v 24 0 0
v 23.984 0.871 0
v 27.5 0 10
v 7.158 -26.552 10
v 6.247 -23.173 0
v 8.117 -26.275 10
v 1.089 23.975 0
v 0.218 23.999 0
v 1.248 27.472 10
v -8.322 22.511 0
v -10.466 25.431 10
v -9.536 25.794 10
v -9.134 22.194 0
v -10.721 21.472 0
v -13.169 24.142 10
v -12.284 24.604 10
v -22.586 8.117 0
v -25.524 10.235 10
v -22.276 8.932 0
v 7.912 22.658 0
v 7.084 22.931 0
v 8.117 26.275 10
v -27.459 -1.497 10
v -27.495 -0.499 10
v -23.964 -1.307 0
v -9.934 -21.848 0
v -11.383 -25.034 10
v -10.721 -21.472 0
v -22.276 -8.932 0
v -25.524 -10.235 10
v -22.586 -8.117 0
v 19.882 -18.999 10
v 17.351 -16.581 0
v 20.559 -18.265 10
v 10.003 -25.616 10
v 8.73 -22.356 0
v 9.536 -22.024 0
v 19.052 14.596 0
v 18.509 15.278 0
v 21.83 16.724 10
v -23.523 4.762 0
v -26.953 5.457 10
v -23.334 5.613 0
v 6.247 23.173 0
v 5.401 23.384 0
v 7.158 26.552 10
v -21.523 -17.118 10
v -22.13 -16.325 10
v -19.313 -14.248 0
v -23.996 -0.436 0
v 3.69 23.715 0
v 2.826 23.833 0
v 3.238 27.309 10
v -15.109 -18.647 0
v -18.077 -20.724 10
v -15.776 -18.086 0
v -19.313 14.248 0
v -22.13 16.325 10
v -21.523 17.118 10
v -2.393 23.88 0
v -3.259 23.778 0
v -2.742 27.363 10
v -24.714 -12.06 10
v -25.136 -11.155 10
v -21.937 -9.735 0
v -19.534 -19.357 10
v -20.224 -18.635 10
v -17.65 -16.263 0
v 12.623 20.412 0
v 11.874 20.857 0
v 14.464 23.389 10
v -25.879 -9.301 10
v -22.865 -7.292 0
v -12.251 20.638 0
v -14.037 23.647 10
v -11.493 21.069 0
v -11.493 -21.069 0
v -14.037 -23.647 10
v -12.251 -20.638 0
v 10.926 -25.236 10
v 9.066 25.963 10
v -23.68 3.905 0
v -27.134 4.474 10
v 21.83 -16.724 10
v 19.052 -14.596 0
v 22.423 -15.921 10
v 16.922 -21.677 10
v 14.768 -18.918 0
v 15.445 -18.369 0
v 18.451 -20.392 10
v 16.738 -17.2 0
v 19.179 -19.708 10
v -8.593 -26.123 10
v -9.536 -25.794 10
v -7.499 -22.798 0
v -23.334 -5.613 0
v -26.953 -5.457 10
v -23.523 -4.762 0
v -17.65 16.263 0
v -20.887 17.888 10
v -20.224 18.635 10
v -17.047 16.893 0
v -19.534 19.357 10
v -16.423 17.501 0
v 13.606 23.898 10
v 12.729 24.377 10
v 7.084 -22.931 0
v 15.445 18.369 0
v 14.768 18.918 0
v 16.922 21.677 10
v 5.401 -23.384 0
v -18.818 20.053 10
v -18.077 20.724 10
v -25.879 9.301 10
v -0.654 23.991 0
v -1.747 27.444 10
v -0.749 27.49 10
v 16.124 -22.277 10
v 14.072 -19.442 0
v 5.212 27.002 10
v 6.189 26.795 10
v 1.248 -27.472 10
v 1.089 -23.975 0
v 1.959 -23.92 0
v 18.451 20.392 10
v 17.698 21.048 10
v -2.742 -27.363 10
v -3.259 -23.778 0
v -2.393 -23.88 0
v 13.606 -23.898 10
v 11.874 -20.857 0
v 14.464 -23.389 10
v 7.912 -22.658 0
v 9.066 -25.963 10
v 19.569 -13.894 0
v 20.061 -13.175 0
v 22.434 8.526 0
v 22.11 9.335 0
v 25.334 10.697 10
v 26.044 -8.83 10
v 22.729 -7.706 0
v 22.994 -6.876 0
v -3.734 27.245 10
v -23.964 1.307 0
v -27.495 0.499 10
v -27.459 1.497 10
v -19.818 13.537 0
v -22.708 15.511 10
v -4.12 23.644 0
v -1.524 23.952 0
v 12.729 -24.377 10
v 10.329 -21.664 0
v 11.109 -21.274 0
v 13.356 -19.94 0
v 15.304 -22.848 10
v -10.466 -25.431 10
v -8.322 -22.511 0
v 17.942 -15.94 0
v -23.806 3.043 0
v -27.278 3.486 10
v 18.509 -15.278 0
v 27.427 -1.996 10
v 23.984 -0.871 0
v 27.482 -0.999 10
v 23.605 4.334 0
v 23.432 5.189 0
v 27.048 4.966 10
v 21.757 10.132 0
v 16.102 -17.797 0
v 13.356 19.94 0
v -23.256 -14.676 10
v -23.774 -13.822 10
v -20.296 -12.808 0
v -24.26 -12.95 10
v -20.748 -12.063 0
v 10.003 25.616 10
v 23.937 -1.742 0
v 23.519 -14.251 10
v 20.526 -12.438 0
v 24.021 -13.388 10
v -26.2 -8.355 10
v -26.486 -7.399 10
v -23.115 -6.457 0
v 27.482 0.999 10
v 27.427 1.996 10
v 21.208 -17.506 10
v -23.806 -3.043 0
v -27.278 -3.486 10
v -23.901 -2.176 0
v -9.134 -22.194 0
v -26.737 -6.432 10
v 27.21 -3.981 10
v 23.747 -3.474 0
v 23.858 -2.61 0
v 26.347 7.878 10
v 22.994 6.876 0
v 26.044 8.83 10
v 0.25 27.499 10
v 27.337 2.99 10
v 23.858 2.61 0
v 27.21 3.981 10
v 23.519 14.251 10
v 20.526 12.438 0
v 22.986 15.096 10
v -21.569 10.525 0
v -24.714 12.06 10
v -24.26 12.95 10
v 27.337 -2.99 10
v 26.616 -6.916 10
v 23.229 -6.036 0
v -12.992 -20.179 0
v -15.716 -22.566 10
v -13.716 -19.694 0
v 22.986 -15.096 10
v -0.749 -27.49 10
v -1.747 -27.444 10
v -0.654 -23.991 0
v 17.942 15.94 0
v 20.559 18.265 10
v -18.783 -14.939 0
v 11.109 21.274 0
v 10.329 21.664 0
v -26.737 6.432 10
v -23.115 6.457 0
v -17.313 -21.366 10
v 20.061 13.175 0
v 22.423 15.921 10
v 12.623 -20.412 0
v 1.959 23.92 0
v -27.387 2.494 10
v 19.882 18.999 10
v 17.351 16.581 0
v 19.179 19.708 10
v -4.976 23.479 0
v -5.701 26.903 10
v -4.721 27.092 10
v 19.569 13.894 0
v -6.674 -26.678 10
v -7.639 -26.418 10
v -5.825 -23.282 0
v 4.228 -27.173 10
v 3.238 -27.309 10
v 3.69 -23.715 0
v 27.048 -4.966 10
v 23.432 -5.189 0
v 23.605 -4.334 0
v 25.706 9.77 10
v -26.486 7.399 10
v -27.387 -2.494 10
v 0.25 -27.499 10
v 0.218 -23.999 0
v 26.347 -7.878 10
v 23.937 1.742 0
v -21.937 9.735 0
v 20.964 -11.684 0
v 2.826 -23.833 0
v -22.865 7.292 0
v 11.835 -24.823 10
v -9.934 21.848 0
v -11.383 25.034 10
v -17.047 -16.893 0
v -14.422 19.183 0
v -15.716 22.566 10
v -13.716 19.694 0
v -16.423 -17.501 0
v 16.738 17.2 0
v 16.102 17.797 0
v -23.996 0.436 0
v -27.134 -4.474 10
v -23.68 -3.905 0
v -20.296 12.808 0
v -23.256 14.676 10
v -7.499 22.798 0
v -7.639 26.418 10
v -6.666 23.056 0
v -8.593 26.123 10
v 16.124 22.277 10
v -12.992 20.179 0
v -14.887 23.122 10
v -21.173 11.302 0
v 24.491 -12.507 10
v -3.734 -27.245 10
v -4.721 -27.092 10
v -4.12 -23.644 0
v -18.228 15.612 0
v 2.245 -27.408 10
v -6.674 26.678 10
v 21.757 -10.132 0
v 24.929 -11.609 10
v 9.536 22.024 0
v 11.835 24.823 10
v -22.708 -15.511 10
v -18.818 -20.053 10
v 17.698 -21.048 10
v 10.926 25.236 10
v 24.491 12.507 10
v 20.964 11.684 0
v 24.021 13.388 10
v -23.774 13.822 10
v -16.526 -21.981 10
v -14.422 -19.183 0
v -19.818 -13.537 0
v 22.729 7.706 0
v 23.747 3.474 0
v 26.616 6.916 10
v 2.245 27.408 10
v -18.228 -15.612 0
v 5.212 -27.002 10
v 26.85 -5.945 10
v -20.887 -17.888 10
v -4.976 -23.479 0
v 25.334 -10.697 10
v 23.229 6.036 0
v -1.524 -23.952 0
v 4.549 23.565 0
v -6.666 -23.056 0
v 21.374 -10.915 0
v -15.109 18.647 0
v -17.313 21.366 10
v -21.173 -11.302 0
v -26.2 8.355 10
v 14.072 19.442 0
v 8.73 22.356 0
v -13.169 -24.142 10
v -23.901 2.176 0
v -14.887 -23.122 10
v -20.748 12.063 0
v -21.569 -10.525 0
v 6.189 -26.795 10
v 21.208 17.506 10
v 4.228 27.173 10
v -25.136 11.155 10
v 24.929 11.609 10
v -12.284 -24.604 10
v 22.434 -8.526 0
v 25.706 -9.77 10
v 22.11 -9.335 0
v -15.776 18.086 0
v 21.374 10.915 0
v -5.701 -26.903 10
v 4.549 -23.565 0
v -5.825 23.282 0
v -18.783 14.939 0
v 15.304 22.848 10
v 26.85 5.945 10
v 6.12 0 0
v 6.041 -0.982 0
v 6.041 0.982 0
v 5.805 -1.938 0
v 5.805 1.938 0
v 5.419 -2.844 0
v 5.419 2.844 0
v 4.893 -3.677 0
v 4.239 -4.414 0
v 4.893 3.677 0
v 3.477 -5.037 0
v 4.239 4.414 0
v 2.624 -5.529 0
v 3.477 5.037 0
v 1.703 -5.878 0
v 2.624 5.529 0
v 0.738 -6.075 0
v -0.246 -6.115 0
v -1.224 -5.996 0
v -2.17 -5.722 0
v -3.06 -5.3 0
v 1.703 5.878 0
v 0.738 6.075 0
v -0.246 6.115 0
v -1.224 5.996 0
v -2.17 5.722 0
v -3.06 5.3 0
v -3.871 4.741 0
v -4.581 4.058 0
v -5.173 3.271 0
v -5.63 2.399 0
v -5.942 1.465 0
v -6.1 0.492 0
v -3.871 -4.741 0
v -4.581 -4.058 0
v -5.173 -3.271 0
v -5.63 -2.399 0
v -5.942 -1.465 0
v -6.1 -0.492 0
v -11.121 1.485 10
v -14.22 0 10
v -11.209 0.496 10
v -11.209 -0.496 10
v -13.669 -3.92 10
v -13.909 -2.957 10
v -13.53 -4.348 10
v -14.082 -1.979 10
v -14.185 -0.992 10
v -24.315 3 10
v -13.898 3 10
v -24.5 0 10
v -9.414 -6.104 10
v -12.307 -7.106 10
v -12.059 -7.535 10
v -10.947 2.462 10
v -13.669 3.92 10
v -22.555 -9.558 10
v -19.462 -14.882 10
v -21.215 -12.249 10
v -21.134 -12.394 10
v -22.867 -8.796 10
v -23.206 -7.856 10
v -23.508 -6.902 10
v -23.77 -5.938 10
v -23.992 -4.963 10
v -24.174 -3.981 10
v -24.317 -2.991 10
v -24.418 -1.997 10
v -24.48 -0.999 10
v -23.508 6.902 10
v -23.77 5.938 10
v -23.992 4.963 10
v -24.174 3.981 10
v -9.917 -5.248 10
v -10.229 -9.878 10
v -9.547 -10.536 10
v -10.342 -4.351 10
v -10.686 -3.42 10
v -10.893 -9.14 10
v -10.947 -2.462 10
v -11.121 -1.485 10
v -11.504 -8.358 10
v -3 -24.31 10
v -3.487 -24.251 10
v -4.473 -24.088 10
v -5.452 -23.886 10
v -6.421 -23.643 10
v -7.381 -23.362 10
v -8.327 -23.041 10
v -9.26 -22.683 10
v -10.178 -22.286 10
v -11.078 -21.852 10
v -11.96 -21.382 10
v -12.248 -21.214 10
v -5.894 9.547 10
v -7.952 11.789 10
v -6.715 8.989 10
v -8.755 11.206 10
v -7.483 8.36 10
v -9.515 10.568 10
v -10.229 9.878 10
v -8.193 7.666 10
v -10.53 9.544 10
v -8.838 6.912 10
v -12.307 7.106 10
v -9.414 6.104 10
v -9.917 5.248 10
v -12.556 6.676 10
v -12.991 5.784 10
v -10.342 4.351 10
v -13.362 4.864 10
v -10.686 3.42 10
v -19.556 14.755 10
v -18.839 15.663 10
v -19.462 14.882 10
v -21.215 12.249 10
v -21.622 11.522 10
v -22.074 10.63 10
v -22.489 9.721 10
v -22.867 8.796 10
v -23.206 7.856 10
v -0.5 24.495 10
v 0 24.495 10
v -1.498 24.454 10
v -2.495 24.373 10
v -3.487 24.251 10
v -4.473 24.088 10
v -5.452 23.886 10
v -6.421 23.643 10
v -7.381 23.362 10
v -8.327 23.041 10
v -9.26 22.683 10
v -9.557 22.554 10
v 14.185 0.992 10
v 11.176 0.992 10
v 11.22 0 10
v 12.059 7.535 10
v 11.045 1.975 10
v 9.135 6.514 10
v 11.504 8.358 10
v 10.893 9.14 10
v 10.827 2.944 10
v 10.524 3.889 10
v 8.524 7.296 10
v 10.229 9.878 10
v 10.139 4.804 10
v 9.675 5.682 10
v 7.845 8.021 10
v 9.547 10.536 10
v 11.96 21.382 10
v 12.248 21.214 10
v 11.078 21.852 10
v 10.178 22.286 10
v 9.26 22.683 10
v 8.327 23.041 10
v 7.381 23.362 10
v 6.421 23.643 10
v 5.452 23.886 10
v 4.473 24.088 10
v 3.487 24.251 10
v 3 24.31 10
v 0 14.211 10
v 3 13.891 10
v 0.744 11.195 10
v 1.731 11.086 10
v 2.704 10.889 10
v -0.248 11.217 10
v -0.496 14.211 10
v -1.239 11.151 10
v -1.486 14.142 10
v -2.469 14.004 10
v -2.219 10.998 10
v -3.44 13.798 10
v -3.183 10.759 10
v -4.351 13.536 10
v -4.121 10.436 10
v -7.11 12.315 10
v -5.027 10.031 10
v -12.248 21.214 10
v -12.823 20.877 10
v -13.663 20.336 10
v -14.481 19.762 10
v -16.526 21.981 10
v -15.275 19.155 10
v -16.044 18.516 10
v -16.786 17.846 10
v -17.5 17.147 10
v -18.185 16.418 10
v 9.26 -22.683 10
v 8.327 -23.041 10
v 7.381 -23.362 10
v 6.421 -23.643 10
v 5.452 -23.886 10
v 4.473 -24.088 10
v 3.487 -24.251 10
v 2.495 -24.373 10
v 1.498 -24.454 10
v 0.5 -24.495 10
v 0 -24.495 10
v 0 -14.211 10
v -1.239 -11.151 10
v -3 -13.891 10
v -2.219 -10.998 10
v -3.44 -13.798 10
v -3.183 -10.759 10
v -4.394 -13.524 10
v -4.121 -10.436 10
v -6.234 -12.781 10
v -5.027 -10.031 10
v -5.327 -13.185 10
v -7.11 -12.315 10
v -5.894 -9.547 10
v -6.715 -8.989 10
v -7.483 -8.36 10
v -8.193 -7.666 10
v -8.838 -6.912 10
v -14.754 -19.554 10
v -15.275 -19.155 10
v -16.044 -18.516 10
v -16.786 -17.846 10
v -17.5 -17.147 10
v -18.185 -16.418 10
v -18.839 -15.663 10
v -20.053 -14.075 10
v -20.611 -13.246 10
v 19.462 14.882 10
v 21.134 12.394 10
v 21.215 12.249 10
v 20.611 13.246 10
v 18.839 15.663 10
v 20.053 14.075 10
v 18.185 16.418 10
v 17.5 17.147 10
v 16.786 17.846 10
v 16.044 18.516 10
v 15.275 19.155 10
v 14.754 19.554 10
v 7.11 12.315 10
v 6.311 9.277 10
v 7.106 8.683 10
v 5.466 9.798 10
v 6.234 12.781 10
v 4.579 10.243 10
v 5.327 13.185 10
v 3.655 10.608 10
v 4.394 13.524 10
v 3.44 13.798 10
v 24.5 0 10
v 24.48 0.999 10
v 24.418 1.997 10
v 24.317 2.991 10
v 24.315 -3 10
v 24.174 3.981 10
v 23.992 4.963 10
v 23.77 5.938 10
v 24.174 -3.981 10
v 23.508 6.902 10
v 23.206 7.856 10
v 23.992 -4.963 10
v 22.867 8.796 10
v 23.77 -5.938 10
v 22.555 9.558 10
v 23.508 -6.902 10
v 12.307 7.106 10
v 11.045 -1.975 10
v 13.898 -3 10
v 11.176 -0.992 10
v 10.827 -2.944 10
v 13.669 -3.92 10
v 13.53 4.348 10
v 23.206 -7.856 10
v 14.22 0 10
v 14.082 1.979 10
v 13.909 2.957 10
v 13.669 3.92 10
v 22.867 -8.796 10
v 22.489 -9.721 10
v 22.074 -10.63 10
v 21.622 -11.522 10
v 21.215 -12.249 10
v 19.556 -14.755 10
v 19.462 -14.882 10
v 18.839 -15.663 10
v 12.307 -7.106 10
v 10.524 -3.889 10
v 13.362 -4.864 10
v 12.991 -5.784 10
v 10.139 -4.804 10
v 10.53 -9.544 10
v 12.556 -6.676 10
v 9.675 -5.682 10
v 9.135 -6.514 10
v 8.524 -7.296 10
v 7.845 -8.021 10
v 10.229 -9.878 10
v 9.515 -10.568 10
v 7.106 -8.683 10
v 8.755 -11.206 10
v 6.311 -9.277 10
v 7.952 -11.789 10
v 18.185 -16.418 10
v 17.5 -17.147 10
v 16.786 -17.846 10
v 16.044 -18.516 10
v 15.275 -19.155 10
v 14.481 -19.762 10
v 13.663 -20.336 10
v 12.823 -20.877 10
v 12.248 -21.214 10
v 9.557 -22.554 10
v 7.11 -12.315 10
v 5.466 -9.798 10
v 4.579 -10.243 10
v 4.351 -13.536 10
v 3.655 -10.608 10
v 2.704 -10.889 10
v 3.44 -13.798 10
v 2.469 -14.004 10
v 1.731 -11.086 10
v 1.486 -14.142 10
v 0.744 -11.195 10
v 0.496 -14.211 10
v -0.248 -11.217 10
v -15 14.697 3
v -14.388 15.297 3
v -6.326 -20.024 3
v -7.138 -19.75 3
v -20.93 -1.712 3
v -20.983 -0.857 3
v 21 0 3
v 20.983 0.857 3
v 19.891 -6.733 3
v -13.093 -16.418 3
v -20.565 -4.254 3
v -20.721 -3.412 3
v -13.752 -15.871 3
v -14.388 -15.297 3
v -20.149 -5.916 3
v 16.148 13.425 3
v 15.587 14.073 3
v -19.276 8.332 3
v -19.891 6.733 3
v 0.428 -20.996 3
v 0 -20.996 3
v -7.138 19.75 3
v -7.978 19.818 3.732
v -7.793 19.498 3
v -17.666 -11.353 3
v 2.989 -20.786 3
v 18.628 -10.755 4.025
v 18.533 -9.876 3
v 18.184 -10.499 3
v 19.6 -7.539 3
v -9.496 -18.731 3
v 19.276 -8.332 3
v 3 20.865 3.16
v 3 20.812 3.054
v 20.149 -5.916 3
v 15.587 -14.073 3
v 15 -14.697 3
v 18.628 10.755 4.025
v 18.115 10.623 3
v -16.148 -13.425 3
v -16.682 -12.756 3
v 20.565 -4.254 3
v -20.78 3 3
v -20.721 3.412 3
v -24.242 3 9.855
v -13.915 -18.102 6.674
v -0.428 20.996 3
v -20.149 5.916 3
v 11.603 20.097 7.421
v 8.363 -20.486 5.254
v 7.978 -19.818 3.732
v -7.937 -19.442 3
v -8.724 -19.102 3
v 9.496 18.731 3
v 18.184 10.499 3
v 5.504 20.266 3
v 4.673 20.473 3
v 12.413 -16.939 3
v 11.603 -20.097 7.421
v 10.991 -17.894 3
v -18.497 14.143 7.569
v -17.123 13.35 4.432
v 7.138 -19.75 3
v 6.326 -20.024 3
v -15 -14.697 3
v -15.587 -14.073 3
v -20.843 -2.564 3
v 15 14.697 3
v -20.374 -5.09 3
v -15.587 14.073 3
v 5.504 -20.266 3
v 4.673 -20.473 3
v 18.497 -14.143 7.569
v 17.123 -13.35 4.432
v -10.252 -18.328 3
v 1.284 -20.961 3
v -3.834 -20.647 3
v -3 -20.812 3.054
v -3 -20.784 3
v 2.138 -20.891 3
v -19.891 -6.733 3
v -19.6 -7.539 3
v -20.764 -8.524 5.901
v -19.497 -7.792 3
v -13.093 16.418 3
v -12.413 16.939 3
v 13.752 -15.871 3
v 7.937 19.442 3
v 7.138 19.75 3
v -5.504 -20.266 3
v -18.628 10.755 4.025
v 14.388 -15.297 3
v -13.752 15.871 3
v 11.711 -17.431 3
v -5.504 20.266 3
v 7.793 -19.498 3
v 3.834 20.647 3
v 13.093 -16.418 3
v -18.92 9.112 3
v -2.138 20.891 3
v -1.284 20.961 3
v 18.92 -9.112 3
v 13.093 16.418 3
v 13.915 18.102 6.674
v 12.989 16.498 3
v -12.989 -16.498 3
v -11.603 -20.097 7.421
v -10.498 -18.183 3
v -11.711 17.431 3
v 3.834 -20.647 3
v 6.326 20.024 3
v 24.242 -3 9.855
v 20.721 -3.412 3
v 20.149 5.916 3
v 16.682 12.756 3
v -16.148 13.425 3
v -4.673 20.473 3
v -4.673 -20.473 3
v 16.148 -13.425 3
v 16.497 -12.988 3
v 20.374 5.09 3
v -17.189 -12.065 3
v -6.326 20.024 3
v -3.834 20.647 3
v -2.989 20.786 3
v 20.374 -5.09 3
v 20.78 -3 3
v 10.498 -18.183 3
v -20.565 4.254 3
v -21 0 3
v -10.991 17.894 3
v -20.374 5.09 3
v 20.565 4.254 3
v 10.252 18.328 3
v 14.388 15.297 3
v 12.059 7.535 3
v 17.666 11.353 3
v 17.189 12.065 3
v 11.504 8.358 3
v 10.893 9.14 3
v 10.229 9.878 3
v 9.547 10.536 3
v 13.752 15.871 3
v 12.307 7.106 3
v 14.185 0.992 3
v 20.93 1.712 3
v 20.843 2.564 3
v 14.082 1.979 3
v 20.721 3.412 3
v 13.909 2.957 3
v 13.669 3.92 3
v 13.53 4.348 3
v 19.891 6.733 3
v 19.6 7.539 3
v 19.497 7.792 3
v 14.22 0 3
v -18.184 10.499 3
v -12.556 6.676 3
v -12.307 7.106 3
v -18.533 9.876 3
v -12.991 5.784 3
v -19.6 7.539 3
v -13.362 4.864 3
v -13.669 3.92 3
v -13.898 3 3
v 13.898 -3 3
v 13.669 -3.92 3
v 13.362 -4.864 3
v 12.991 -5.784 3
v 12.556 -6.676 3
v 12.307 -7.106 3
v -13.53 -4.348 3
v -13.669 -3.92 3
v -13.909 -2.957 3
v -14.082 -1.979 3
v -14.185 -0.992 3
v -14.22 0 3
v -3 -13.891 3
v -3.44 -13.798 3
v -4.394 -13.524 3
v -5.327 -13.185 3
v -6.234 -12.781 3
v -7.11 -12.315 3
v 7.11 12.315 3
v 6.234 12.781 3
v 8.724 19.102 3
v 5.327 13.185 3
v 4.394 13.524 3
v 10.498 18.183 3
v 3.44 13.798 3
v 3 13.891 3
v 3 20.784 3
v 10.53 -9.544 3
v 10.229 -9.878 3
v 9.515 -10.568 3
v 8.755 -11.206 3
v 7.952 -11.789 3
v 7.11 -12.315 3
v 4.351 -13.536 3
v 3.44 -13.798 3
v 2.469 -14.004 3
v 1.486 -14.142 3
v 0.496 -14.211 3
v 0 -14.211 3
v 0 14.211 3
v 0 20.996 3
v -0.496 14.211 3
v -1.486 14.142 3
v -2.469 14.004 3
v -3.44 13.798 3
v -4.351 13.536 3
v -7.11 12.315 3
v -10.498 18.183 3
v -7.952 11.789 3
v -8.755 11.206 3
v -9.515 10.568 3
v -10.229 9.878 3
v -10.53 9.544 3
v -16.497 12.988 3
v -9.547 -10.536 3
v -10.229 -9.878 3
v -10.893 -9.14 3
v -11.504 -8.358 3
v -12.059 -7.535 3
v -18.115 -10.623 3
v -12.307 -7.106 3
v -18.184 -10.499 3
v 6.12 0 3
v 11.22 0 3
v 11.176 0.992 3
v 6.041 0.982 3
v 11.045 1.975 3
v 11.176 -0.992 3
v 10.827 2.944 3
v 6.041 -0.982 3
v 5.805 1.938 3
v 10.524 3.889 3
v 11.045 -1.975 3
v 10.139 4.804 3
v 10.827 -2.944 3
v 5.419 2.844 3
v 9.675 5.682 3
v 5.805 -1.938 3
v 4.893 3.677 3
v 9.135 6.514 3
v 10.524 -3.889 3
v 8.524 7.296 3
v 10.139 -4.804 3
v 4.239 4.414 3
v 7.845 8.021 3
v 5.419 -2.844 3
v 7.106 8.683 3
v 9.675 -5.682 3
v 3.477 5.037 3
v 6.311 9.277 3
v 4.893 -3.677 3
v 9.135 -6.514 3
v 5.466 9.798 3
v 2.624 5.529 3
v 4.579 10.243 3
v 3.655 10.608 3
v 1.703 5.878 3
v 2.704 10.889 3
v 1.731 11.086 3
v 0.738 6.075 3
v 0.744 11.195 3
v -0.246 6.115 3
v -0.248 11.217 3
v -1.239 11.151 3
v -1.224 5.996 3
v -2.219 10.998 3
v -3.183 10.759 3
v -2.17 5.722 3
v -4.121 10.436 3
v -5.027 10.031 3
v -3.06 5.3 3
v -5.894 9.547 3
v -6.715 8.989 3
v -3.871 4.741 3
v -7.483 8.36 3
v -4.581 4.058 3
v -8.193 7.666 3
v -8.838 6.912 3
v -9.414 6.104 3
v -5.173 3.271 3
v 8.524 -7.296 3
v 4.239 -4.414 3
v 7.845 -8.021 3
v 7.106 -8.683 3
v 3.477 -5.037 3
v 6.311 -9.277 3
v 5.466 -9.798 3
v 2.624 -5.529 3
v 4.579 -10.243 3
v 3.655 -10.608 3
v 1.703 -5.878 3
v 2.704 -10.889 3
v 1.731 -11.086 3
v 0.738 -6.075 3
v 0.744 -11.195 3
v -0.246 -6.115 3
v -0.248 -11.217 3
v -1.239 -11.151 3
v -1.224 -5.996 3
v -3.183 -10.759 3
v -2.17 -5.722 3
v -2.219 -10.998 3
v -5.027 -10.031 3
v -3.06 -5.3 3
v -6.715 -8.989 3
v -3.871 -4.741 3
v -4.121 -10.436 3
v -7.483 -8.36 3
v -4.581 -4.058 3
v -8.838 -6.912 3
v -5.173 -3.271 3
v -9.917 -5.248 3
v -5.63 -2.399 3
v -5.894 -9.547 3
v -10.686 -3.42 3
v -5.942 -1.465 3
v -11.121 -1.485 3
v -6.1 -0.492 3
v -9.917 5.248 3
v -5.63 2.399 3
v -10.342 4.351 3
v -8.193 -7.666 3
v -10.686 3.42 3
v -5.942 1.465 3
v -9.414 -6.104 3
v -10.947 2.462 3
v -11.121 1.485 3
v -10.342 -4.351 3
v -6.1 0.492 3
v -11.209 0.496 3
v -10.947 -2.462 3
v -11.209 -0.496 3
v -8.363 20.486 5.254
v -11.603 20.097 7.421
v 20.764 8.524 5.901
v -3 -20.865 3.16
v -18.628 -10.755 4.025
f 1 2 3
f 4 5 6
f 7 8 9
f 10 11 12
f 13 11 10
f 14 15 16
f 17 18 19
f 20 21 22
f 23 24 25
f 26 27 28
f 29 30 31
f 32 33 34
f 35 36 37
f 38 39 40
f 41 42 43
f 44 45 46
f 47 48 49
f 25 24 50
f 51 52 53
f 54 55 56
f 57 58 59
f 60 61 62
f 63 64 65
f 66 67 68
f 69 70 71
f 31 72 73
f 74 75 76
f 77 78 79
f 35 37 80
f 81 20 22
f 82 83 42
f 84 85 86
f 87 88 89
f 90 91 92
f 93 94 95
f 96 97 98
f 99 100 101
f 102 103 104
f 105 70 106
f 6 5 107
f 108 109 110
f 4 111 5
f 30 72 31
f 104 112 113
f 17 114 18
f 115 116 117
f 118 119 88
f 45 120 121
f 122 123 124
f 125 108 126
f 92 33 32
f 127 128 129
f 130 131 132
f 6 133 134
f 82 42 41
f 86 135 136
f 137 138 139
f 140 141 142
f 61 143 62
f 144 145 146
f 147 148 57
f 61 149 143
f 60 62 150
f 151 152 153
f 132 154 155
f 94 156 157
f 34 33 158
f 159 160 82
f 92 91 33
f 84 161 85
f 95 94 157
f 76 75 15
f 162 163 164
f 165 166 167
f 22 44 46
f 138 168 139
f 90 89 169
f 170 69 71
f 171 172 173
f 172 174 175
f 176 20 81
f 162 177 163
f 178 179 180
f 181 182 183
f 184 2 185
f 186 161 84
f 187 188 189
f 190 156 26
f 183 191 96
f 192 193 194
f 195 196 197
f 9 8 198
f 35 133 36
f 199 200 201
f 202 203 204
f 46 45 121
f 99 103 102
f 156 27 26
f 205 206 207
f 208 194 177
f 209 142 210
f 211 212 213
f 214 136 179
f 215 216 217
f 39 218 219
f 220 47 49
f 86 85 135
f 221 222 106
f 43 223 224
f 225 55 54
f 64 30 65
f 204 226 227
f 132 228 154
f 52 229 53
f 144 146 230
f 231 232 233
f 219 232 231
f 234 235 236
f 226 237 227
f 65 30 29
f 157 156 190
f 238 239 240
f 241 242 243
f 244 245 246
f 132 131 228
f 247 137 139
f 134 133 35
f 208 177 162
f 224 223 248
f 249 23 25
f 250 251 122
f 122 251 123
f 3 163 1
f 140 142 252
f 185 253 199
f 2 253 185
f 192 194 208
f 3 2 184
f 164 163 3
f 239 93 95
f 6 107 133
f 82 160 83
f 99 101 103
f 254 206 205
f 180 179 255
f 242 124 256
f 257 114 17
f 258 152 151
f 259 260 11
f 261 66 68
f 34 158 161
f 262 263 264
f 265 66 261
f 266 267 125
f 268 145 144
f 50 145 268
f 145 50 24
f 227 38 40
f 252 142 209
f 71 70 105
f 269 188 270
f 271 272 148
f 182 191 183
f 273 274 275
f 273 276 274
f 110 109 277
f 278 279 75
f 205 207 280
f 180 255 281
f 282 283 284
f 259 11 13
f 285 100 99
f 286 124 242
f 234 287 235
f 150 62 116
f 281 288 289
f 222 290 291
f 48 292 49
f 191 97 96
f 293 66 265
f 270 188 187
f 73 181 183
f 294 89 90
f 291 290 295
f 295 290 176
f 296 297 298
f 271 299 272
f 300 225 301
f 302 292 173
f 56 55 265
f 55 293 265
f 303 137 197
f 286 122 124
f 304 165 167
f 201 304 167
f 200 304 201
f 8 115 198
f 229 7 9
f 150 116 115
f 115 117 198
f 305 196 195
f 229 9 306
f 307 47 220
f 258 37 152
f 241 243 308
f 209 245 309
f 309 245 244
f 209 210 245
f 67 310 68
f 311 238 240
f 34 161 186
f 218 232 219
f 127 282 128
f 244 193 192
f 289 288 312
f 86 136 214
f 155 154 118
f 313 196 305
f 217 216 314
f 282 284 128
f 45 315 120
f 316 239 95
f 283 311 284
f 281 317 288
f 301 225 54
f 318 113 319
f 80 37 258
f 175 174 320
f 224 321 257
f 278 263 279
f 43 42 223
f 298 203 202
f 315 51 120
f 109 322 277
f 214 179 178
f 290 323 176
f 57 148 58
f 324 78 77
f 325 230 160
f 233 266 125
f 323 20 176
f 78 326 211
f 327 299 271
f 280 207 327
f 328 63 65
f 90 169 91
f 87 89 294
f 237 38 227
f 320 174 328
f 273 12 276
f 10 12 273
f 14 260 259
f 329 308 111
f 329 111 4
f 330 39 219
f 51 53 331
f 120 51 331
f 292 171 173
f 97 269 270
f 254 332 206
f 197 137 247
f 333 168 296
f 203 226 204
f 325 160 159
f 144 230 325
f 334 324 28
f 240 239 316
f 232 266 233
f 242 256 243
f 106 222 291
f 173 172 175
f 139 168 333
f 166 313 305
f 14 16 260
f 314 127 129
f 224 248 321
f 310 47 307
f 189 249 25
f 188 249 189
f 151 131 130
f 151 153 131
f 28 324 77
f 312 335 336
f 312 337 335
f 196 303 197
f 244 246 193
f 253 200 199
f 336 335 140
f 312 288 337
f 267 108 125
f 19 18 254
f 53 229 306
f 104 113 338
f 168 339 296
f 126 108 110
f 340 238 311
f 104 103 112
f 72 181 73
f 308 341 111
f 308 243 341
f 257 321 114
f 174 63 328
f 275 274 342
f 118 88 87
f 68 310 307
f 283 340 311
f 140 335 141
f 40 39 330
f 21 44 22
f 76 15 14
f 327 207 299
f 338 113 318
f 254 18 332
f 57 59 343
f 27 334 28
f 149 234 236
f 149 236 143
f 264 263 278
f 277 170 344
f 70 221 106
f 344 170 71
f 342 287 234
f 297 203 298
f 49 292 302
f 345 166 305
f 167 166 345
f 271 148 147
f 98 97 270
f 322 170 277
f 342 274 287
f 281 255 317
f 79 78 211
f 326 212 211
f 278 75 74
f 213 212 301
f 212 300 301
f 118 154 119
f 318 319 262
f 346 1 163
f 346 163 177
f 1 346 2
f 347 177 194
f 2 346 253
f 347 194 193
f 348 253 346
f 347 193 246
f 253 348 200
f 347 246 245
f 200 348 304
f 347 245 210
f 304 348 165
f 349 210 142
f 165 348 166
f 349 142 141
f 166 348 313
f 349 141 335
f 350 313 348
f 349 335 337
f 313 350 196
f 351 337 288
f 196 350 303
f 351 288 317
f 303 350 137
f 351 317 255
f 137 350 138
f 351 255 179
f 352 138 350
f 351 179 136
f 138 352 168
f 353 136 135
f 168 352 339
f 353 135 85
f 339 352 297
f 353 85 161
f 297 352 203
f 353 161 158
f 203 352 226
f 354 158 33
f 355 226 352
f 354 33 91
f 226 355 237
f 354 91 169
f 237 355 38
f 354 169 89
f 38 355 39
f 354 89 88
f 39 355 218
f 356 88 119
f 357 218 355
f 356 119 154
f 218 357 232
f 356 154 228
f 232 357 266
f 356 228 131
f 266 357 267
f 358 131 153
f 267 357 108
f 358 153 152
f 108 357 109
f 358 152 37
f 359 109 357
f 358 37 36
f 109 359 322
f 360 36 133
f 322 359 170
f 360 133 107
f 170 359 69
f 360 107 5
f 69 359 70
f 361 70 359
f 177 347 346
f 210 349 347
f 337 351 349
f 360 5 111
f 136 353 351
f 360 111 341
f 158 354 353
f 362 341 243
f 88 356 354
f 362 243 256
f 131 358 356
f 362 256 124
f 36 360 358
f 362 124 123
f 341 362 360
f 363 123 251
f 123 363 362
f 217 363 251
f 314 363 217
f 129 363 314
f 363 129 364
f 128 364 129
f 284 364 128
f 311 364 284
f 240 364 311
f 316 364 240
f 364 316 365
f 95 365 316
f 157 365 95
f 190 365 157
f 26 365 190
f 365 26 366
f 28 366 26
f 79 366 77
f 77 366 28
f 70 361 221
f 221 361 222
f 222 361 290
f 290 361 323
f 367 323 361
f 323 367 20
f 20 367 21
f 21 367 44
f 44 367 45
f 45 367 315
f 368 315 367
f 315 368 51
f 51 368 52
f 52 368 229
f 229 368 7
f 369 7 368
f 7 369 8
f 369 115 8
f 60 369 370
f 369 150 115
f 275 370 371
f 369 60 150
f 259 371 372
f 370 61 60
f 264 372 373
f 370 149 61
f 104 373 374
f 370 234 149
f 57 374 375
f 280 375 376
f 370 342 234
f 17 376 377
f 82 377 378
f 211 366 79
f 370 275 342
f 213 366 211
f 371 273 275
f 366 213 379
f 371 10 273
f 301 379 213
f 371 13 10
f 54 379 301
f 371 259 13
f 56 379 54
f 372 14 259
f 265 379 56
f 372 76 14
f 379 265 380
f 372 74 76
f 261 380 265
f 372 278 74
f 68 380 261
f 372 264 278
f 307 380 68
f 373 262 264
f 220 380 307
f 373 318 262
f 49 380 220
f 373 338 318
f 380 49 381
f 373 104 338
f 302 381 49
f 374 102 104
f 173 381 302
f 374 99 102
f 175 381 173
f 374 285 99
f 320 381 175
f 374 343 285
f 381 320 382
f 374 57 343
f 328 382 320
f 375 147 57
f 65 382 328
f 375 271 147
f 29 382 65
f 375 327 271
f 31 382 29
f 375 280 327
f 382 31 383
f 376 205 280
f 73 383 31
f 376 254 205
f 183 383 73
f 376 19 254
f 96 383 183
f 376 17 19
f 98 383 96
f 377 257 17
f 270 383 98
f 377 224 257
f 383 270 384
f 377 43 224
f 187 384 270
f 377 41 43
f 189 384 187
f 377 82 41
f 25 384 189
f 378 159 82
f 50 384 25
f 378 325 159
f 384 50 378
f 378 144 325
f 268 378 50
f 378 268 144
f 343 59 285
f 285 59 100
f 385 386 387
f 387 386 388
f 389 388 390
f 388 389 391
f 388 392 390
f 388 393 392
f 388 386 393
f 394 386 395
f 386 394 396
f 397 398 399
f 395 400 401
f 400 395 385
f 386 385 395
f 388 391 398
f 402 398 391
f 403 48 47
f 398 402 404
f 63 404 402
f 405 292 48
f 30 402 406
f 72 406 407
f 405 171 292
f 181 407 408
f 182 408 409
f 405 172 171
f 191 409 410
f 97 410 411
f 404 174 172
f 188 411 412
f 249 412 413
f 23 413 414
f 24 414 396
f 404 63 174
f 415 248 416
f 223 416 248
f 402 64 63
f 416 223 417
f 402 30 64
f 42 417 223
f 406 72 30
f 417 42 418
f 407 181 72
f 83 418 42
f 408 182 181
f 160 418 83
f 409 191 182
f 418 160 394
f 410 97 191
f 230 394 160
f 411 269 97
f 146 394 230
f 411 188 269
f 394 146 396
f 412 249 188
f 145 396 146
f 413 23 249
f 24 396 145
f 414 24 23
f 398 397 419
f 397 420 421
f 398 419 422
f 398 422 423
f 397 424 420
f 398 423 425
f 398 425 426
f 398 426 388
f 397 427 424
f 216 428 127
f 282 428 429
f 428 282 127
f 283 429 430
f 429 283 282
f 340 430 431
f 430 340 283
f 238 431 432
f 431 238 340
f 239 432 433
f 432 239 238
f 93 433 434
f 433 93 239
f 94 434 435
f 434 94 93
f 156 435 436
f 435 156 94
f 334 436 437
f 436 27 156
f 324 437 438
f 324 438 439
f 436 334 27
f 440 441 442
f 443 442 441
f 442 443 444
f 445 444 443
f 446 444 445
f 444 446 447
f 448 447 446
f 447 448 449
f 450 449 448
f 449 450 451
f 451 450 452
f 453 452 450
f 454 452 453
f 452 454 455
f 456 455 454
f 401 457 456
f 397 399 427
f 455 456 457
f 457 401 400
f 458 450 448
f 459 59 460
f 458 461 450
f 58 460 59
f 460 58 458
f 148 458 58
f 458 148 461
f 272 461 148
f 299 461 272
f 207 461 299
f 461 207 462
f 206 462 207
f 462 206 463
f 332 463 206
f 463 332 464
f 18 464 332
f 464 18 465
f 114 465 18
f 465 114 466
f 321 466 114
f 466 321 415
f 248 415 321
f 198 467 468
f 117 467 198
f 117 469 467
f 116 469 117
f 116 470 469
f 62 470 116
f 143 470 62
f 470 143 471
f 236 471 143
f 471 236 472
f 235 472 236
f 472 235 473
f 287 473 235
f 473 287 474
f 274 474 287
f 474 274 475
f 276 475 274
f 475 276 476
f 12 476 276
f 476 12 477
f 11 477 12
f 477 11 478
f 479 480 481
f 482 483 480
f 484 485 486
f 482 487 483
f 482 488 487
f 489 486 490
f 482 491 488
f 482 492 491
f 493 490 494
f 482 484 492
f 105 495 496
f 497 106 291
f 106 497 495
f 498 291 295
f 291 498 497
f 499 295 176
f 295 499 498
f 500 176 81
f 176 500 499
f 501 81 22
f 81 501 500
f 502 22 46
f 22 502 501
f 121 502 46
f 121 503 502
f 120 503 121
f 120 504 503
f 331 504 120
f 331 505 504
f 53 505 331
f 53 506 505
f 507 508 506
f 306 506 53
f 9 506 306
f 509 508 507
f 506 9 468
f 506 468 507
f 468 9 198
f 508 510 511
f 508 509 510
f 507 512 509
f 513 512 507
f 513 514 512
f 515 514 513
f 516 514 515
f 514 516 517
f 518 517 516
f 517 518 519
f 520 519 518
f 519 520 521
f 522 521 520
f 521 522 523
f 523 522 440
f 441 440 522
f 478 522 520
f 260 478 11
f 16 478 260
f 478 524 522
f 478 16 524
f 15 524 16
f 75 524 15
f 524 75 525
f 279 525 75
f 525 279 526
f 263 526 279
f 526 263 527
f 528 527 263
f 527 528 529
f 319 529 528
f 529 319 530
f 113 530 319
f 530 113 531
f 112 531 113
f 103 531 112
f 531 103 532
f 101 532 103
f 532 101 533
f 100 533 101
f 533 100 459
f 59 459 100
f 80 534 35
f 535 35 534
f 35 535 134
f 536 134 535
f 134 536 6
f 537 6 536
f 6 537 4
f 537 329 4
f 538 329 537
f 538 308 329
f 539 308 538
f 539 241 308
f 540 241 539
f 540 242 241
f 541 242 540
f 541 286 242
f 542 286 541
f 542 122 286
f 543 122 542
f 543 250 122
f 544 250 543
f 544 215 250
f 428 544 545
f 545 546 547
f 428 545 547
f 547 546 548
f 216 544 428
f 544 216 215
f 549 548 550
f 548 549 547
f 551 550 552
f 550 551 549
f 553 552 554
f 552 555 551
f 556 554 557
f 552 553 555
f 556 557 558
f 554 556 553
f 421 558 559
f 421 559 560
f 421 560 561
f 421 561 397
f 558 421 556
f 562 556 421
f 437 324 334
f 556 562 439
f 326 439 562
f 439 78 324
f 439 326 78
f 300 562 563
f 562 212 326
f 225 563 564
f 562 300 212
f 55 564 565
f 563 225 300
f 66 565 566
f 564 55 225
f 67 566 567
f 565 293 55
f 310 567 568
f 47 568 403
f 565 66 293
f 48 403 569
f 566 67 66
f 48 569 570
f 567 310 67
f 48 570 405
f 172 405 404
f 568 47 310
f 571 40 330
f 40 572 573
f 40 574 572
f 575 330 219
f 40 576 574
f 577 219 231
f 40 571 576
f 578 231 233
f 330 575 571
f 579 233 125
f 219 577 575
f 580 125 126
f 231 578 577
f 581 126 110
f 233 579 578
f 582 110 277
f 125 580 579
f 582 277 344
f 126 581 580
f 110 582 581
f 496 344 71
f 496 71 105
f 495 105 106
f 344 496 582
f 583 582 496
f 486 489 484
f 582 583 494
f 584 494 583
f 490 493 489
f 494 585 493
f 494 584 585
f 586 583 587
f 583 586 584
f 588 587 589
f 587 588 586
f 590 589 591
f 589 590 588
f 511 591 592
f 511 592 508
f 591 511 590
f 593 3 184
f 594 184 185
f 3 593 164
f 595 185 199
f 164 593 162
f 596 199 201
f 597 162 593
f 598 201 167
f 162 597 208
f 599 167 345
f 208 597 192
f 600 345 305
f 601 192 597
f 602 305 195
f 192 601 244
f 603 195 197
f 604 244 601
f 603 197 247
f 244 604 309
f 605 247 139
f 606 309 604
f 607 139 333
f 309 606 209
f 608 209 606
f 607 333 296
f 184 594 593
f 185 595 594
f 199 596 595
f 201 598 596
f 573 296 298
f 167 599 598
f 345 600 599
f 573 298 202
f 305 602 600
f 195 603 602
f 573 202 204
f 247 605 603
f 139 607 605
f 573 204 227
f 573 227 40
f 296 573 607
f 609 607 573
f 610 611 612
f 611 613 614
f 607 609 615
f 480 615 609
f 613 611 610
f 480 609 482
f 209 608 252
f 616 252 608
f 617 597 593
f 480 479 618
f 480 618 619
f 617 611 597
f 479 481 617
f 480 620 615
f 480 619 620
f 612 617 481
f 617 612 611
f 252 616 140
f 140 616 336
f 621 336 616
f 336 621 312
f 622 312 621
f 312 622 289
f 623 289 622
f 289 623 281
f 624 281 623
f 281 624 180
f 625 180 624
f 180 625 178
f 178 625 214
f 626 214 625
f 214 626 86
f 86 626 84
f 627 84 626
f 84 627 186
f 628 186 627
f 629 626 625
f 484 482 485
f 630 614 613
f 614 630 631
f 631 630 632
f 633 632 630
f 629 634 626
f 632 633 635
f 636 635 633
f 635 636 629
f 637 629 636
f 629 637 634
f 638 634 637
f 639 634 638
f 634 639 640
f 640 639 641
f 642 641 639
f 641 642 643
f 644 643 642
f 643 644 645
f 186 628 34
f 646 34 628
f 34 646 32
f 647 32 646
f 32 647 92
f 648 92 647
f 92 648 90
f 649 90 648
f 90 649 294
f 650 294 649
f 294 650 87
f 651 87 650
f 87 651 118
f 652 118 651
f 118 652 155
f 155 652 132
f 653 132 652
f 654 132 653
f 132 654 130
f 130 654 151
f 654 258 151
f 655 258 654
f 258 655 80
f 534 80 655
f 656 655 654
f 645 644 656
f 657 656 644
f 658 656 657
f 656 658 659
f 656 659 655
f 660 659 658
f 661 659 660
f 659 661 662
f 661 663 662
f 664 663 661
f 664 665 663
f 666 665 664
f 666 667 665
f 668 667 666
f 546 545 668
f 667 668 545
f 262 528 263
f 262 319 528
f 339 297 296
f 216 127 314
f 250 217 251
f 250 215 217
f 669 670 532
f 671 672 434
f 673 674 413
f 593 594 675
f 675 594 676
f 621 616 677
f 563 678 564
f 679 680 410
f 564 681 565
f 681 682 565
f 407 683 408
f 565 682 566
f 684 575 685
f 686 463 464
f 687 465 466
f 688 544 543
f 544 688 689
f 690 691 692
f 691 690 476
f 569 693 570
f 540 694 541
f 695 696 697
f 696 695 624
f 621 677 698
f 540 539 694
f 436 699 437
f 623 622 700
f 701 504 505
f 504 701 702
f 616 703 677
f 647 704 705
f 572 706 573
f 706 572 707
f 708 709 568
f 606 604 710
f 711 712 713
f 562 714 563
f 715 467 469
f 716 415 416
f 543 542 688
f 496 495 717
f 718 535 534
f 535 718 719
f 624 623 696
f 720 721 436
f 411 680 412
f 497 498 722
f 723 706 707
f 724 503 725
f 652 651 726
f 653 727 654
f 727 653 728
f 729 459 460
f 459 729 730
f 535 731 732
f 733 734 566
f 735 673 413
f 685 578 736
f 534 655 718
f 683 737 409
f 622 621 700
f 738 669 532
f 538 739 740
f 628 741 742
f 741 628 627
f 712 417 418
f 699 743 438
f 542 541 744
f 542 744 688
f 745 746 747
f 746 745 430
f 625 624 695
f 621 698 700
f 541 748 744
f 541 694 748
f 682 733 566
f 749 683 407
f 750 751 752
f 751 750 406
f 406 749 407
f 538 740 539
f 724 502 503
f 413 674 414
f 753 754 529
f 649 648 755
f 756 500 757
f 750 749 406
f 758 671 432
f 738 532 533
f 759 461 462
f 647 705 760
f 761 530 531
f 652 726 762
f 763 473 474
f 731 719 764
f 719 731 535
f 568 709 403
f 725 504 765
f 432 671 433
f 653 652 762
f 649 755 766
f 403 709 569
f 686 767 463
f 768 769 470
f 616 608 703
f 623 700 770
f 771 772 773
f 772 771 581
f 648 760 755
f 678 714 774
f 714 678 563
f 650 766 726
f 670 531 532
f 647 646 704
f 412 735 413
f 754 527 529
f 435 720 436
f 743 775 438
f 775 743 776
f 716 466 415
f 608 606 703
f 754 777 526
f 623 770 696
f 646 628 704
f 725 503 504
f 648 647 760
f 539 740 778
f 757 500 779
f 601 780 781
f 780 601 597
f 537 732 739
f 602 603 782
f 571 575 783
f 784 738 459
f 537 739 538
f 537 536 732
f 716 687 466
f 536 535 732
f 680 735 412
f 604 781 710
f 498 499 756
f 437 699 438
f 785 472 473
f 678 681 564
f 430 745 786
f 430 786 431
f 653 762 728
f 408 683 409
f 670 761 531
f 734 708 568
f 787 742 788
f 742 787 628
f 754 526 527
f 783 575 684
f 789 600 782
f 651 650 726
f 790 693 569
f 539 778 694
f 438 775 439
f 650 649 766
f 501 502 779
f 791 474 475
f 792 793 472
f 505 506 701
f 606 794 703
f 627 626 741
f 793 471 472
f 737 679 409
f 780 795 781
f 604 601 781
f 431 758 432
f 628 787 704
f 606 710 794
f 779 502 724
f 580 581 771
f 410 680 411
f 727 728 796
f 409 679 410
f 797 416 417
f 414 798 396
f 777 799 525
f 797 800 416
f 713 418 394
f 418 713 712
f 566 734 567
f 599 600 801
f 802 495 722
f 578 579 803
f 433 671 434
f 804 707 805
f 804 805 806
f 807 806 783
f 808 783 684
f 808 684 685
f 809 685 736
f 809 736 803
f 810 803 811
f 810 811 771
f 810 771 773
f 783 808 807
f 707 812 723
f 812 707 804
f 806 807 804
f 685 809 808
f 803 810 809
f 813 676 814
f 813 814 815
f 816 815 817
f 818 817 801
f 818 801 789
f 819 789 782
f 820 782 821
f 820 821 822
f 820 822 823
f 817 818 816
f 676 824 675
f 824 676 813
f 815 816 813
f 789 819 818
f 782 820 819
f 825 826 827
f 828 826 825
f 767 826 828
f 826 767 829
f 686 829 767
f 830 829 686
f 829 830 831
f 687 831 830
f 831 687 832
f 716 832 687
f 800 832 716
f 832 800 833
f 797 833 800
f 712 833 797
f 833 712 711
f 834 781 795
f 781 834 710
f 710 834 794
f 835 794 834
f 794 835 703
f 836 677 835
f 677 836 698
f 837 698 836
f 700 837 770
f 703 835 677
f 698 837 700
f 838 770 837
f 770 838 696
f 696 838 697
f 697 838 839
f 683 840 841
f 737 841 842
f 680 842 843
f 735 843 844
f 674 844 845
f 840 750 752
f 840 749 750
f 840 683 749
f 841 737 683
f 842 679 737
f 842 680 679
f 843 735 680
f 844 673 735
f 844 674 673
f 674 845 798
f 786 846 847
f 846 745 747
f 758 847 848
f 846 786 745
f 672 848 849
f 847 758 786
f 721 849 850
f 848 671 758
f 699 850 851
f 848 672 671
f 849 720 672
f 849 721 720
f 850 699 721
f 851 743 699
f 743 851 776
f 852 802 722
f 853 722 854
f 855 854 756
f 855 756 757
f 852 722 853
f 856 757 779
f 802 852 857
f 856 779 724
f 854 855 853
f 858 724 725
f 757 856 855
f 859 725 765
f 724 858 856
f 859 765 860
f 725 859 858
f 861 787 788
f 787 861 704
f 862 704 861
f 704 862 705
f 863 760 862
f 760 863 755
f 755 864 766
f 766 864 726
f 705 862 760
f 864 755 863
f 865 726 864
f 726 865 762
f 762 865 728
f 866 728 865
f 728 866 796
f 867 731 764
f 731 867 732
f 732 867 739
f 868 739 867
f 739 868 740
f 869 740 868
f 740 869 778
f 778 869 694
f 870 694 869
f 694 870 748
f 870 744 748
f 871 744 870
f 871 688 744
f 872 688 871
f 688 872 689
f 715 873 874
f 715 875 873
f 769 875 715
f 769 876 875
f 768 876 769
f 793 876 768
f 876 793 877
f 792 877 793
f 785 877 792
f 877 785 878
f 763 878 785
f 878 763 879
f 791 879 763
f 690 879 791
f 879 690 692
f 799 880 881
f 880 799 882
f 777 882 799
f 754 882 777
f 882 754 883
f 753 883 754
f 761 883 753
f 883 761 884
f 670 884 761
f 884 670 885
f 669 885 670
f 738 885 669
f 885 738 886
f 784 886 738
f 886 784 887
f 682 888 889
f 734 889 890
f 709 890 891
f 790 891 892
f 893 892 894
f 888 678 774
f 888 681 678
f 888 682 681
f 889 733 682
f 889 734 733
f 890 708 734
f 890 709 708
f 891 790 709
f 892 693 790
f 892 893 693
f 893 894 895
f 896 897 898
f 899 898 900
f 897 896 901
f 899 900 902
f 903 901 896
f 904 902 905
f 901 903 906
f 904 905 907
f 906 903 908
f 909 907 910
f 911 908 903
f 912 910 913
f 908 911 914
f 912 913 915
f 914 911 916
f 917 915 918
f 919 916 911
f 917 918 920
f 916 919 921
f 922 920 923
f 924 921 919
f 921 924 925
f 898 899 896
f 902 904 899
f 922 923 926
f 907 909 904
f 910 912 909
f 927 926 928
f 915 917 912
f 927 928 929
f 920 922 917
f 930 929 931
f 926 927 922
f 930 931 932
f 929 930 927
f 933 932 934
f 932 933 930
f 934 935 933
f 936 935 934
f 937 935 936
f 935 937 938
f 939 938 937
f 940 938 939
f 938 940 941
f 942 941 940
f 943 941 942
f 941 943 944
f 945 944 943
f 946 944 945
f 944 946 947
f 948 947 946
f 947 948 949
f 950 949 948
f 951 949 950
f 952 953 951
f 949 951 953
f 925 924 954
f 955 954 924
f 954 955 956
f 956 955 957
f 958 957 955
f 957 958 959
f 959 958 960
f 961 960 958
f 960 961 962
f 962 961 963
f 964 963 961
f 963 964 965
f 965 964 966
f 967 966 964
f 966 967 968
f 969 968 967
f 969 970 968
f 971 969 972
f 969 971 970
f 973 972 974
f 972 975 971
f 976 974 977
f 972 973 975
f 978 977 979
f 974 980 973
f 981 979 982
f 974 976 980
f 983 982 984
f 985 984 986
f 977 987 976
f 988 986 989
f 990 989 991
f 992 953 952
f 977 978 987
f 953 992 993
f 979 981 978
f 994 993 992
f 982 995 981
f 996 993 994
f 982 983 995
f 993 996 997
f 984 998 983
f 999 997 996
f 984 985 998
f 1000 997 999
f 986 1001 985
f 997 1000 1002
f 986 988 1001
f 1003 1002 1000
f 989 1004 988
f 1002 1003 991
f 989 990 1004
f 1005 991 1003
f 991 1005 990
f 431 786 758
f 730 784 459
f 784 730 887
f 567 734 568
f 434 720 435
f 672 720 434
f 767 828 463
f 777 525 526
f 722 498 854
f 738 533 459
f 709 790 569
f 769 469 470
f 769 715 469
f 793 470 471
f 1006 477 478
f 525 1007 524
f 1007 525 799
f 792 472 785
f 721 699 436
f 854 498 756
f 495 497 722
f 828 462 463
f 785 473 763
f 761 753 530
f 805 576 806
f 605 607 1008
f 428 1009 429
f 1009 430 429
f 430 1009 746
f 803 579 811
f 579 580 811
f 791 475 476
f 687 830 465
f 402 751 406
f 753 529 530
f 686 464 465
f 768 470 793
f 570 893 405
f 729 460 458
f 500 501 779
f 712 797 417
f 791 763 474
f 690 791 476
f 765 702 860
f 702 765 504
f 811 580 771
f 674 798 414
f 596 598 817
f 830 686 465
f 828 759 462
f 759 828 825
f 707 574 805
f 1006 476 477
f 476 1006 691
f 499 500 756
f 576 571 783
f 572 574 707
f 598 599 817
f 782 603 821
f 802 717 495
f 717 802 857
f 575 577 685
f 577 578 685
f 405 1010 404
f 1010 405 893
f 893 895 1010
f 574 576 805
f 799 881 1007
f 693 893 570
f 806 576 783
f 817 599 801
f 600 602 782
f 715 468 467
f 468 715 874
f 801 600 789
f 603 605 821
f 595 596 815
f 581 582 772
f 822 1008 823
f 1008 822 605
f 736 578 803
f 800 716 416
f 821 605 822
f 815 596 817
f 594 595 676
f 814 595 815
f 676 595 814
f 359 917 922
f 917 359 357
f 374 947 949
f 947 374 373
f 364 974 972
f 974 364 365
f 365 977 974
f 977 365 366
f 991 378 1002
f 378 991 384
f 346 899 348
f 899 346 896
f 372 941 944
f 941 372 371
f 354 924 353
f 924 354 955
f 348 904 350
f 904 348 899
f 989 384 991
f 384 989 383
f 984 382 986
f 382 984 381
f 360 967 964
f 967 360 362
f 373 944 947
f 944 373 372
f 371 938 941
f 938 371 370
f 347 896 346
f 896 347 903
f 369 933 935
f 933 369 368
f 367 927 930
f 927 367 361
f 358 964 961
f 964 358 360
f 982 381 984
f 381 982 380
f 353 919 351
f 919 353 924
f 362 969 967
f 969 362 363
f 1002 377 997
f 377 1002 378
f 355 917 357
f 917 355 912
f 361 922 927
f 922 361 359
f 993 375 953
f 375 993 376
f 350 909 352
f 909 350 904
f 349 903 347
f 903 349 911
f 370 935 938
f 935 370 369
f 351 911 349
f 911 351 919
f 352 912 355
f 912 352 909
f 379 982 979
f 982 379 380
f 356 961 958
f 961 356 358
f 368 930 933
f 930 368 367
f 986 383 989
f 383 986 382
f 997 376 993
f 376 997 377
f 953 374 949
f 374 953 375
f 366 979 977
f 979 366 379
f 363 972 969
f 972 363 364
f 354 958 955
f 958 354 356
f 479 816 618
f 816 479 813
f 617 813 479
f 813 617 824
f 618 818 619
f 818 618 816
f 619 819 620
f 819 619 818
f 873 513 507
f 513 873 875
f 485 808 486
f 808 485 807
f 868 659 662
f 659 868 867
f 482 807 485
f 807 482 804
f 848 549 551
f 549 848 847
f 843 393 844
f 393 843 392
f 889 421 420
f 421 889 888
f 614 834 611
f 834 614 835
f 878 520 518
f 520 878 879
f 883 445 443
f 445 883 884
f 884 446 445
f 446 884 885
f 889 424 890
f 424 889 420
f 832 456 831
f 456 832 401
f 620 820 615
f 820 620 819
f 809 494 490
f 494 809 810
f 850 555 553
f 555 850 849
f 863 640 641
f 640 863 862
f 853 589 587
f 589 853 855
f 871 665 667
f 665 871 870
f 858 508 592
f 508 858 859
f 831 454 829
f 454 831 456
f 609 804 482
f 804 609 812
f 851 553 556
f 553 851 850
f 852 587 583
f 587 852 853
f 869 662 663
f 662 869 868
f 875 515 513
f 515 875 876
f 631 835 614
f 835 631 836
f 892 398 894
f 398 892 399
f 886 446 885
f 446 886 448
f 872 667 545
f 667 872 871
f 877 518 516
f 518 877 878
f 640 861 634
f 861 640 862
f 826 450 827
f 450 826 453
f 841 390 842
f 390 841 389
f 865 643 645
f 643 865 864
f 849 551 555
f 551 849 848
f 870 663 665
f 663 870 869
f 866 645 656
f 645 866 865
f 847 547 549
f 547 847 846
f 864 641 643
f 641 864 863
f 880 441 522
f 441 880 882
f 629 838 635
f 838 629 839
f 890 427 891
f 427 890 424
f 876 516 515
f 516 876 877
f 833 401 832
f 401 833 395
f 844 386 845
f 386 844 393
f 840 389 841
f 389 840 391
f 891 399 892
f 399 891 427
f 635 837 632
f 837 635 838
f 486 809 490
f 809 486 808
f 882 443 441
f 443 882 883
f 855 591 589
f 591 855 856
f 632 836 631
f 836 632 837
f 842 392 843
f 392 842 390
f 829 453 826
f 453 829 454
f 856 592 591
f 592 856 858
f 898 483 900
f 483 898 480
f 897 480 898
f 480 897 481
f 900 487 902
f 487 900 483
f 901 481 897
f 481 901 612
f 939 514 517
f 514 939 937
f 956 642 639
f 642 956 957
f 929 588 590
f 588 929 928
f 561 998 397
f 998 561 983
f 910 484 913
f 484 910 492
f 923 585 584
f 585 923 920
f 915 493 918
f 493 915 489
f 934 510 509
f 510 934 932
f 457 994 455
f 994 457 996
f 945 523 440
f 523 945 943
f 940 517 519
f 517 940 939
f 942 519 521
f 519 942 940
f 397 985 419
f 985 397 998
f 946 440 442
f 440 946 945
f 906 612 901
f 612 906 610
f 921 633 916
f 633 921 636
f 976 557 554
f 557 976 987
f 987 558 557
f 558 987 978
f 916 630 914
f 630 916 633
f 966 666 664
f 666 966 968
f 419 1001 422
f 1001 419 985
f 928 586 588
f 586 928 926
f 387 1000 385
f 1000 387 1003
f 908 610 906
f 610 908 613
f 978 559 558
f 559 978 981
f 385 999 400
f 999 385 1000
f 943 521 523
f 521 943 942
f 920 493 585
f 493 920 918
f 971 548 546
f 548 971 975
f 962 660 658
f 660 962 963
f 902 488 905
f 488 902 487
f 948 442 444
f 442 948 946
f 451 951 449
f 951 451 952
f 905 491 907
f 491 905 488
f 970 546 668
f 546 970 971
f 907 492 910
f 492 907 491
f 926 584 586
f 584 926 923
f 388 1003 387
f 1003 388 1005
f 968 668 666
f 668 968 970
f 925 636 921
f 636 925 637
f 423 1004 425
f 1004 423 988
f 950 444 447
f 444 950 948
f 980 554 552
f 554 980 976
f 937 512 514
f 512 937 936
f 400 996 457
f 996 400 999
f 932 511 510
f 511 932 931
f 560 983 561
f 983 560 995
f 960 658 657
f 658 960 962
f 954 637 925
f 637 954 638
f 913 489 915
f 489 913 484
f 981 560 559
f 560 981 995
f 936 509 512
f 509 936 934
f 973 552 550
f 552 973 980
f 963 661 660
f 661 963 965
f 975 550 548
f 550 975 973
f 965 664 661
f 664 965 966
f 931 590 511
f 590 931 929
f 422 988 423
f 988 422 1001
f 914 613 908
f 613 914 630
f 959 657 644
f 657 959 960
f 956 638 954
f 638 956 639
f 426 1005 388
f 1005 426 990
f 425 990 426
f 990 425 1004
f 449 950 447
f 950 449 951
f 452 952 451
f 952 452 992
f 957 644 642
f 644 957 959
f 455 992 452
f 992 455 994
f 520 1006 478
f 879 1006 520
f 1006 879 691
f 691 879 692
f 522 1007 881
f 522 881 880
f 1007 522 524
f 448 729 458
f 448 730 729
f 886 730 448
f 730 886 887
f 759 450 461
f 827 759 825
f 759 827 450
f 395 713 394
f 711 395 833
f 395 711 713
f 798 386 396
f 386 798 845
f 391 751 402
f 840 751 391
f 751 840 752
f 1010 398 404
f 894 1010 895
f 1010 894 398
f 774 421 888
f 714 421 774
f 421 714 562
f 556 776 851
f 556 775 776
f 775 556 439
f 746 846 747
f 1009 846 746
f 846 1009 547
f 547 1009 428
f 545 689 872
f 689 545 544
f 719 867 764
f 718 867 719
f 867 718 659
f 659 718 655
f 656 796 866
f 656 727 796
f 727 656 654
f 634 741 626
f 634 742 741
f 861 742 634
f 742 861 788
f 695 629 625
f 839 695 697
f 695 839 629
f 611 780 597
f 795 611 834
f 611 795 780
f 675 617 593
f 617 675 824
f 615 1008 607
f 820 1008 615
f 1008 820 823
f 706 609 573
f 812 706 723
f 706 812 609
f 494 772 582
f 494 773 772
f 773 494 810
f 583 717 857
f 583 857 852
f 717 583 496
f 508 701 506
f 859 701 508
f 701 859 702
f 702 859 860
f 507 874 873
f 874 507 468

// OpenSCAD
/* Builds a reel hub that handles most common reel sizes.
   For FlashForge Inventor, the reel stand needs to be replaced.
   See reel-holder.scad for details.

   Uses commonly available skate board bearings.
*/

$fa=1;
$fs=1;

BearingDiameter = 22;
BearingID = 8;
BearingClearance = 12; // Minimum clearance required to ensure inner sleeve is not covered
BearingHeight = 7;
MinReelDiameter=48;
MaxReelDiameter=55;
MaxIntrusion=10; // Maximum depth to penetrate into the reel hub
WallThickness = 3;

// Add 2% to the radius to compensate for the interior polygon effect
BearingOuterRadius = BearingDiameter * 1.02 / 2;
BearingInnerRadius = BearingClearance * 1.02 / 2;

// Outer reel cone and top plate
difference(){
    cylinder(r2=MaxReelDiameter/2, r1=MinReelDiameter/2, h=MaxIntrusion);
    translate([0,0,MaxIntrusion-BearingHeight]){
        cylinder(r2=MaxReelDiameter/2-WallThickness, r1=MinReelDiameter/2-WallThickness, h=BearingHeight);
    }
    cylinder(r=BearingInnerRadius, h=MaxIntrusion);
}

// Inner bearing holder ring
translate([0,0,MaxIntrusion-BearingHeight]){
    difference(){
        cylinder(r=BearingOuterRadius+WallThickness, h=BearingHeight);
        cylinder(r=BearingOuterRadius, h=BearingHeight);
    }
}

// Bracing between the two
intersection(){
    translate([0,0,MaxIntrusion-BearingHeight]){
        for (i = [1:12]){
            rotate(a=360*i/12,v=[0,0,1]){
                difference(){
                    cube([WallThickness, MaxReelDiameter/2, BearingHeight]);
                    cube([WallThickness, BearingOuterRadius, BearingHeight]);
                }
            }
        }
    }
    difference(){
        cylinder(r2=MaxReelDiameter/2-WallThickness, r1=MinReelDiameter/2-WallThickness, h=MaxIntrusion);
        cylinder(r=BearingOuterRadius+WallThickness, h=MaxIntrusion);
    }
}
